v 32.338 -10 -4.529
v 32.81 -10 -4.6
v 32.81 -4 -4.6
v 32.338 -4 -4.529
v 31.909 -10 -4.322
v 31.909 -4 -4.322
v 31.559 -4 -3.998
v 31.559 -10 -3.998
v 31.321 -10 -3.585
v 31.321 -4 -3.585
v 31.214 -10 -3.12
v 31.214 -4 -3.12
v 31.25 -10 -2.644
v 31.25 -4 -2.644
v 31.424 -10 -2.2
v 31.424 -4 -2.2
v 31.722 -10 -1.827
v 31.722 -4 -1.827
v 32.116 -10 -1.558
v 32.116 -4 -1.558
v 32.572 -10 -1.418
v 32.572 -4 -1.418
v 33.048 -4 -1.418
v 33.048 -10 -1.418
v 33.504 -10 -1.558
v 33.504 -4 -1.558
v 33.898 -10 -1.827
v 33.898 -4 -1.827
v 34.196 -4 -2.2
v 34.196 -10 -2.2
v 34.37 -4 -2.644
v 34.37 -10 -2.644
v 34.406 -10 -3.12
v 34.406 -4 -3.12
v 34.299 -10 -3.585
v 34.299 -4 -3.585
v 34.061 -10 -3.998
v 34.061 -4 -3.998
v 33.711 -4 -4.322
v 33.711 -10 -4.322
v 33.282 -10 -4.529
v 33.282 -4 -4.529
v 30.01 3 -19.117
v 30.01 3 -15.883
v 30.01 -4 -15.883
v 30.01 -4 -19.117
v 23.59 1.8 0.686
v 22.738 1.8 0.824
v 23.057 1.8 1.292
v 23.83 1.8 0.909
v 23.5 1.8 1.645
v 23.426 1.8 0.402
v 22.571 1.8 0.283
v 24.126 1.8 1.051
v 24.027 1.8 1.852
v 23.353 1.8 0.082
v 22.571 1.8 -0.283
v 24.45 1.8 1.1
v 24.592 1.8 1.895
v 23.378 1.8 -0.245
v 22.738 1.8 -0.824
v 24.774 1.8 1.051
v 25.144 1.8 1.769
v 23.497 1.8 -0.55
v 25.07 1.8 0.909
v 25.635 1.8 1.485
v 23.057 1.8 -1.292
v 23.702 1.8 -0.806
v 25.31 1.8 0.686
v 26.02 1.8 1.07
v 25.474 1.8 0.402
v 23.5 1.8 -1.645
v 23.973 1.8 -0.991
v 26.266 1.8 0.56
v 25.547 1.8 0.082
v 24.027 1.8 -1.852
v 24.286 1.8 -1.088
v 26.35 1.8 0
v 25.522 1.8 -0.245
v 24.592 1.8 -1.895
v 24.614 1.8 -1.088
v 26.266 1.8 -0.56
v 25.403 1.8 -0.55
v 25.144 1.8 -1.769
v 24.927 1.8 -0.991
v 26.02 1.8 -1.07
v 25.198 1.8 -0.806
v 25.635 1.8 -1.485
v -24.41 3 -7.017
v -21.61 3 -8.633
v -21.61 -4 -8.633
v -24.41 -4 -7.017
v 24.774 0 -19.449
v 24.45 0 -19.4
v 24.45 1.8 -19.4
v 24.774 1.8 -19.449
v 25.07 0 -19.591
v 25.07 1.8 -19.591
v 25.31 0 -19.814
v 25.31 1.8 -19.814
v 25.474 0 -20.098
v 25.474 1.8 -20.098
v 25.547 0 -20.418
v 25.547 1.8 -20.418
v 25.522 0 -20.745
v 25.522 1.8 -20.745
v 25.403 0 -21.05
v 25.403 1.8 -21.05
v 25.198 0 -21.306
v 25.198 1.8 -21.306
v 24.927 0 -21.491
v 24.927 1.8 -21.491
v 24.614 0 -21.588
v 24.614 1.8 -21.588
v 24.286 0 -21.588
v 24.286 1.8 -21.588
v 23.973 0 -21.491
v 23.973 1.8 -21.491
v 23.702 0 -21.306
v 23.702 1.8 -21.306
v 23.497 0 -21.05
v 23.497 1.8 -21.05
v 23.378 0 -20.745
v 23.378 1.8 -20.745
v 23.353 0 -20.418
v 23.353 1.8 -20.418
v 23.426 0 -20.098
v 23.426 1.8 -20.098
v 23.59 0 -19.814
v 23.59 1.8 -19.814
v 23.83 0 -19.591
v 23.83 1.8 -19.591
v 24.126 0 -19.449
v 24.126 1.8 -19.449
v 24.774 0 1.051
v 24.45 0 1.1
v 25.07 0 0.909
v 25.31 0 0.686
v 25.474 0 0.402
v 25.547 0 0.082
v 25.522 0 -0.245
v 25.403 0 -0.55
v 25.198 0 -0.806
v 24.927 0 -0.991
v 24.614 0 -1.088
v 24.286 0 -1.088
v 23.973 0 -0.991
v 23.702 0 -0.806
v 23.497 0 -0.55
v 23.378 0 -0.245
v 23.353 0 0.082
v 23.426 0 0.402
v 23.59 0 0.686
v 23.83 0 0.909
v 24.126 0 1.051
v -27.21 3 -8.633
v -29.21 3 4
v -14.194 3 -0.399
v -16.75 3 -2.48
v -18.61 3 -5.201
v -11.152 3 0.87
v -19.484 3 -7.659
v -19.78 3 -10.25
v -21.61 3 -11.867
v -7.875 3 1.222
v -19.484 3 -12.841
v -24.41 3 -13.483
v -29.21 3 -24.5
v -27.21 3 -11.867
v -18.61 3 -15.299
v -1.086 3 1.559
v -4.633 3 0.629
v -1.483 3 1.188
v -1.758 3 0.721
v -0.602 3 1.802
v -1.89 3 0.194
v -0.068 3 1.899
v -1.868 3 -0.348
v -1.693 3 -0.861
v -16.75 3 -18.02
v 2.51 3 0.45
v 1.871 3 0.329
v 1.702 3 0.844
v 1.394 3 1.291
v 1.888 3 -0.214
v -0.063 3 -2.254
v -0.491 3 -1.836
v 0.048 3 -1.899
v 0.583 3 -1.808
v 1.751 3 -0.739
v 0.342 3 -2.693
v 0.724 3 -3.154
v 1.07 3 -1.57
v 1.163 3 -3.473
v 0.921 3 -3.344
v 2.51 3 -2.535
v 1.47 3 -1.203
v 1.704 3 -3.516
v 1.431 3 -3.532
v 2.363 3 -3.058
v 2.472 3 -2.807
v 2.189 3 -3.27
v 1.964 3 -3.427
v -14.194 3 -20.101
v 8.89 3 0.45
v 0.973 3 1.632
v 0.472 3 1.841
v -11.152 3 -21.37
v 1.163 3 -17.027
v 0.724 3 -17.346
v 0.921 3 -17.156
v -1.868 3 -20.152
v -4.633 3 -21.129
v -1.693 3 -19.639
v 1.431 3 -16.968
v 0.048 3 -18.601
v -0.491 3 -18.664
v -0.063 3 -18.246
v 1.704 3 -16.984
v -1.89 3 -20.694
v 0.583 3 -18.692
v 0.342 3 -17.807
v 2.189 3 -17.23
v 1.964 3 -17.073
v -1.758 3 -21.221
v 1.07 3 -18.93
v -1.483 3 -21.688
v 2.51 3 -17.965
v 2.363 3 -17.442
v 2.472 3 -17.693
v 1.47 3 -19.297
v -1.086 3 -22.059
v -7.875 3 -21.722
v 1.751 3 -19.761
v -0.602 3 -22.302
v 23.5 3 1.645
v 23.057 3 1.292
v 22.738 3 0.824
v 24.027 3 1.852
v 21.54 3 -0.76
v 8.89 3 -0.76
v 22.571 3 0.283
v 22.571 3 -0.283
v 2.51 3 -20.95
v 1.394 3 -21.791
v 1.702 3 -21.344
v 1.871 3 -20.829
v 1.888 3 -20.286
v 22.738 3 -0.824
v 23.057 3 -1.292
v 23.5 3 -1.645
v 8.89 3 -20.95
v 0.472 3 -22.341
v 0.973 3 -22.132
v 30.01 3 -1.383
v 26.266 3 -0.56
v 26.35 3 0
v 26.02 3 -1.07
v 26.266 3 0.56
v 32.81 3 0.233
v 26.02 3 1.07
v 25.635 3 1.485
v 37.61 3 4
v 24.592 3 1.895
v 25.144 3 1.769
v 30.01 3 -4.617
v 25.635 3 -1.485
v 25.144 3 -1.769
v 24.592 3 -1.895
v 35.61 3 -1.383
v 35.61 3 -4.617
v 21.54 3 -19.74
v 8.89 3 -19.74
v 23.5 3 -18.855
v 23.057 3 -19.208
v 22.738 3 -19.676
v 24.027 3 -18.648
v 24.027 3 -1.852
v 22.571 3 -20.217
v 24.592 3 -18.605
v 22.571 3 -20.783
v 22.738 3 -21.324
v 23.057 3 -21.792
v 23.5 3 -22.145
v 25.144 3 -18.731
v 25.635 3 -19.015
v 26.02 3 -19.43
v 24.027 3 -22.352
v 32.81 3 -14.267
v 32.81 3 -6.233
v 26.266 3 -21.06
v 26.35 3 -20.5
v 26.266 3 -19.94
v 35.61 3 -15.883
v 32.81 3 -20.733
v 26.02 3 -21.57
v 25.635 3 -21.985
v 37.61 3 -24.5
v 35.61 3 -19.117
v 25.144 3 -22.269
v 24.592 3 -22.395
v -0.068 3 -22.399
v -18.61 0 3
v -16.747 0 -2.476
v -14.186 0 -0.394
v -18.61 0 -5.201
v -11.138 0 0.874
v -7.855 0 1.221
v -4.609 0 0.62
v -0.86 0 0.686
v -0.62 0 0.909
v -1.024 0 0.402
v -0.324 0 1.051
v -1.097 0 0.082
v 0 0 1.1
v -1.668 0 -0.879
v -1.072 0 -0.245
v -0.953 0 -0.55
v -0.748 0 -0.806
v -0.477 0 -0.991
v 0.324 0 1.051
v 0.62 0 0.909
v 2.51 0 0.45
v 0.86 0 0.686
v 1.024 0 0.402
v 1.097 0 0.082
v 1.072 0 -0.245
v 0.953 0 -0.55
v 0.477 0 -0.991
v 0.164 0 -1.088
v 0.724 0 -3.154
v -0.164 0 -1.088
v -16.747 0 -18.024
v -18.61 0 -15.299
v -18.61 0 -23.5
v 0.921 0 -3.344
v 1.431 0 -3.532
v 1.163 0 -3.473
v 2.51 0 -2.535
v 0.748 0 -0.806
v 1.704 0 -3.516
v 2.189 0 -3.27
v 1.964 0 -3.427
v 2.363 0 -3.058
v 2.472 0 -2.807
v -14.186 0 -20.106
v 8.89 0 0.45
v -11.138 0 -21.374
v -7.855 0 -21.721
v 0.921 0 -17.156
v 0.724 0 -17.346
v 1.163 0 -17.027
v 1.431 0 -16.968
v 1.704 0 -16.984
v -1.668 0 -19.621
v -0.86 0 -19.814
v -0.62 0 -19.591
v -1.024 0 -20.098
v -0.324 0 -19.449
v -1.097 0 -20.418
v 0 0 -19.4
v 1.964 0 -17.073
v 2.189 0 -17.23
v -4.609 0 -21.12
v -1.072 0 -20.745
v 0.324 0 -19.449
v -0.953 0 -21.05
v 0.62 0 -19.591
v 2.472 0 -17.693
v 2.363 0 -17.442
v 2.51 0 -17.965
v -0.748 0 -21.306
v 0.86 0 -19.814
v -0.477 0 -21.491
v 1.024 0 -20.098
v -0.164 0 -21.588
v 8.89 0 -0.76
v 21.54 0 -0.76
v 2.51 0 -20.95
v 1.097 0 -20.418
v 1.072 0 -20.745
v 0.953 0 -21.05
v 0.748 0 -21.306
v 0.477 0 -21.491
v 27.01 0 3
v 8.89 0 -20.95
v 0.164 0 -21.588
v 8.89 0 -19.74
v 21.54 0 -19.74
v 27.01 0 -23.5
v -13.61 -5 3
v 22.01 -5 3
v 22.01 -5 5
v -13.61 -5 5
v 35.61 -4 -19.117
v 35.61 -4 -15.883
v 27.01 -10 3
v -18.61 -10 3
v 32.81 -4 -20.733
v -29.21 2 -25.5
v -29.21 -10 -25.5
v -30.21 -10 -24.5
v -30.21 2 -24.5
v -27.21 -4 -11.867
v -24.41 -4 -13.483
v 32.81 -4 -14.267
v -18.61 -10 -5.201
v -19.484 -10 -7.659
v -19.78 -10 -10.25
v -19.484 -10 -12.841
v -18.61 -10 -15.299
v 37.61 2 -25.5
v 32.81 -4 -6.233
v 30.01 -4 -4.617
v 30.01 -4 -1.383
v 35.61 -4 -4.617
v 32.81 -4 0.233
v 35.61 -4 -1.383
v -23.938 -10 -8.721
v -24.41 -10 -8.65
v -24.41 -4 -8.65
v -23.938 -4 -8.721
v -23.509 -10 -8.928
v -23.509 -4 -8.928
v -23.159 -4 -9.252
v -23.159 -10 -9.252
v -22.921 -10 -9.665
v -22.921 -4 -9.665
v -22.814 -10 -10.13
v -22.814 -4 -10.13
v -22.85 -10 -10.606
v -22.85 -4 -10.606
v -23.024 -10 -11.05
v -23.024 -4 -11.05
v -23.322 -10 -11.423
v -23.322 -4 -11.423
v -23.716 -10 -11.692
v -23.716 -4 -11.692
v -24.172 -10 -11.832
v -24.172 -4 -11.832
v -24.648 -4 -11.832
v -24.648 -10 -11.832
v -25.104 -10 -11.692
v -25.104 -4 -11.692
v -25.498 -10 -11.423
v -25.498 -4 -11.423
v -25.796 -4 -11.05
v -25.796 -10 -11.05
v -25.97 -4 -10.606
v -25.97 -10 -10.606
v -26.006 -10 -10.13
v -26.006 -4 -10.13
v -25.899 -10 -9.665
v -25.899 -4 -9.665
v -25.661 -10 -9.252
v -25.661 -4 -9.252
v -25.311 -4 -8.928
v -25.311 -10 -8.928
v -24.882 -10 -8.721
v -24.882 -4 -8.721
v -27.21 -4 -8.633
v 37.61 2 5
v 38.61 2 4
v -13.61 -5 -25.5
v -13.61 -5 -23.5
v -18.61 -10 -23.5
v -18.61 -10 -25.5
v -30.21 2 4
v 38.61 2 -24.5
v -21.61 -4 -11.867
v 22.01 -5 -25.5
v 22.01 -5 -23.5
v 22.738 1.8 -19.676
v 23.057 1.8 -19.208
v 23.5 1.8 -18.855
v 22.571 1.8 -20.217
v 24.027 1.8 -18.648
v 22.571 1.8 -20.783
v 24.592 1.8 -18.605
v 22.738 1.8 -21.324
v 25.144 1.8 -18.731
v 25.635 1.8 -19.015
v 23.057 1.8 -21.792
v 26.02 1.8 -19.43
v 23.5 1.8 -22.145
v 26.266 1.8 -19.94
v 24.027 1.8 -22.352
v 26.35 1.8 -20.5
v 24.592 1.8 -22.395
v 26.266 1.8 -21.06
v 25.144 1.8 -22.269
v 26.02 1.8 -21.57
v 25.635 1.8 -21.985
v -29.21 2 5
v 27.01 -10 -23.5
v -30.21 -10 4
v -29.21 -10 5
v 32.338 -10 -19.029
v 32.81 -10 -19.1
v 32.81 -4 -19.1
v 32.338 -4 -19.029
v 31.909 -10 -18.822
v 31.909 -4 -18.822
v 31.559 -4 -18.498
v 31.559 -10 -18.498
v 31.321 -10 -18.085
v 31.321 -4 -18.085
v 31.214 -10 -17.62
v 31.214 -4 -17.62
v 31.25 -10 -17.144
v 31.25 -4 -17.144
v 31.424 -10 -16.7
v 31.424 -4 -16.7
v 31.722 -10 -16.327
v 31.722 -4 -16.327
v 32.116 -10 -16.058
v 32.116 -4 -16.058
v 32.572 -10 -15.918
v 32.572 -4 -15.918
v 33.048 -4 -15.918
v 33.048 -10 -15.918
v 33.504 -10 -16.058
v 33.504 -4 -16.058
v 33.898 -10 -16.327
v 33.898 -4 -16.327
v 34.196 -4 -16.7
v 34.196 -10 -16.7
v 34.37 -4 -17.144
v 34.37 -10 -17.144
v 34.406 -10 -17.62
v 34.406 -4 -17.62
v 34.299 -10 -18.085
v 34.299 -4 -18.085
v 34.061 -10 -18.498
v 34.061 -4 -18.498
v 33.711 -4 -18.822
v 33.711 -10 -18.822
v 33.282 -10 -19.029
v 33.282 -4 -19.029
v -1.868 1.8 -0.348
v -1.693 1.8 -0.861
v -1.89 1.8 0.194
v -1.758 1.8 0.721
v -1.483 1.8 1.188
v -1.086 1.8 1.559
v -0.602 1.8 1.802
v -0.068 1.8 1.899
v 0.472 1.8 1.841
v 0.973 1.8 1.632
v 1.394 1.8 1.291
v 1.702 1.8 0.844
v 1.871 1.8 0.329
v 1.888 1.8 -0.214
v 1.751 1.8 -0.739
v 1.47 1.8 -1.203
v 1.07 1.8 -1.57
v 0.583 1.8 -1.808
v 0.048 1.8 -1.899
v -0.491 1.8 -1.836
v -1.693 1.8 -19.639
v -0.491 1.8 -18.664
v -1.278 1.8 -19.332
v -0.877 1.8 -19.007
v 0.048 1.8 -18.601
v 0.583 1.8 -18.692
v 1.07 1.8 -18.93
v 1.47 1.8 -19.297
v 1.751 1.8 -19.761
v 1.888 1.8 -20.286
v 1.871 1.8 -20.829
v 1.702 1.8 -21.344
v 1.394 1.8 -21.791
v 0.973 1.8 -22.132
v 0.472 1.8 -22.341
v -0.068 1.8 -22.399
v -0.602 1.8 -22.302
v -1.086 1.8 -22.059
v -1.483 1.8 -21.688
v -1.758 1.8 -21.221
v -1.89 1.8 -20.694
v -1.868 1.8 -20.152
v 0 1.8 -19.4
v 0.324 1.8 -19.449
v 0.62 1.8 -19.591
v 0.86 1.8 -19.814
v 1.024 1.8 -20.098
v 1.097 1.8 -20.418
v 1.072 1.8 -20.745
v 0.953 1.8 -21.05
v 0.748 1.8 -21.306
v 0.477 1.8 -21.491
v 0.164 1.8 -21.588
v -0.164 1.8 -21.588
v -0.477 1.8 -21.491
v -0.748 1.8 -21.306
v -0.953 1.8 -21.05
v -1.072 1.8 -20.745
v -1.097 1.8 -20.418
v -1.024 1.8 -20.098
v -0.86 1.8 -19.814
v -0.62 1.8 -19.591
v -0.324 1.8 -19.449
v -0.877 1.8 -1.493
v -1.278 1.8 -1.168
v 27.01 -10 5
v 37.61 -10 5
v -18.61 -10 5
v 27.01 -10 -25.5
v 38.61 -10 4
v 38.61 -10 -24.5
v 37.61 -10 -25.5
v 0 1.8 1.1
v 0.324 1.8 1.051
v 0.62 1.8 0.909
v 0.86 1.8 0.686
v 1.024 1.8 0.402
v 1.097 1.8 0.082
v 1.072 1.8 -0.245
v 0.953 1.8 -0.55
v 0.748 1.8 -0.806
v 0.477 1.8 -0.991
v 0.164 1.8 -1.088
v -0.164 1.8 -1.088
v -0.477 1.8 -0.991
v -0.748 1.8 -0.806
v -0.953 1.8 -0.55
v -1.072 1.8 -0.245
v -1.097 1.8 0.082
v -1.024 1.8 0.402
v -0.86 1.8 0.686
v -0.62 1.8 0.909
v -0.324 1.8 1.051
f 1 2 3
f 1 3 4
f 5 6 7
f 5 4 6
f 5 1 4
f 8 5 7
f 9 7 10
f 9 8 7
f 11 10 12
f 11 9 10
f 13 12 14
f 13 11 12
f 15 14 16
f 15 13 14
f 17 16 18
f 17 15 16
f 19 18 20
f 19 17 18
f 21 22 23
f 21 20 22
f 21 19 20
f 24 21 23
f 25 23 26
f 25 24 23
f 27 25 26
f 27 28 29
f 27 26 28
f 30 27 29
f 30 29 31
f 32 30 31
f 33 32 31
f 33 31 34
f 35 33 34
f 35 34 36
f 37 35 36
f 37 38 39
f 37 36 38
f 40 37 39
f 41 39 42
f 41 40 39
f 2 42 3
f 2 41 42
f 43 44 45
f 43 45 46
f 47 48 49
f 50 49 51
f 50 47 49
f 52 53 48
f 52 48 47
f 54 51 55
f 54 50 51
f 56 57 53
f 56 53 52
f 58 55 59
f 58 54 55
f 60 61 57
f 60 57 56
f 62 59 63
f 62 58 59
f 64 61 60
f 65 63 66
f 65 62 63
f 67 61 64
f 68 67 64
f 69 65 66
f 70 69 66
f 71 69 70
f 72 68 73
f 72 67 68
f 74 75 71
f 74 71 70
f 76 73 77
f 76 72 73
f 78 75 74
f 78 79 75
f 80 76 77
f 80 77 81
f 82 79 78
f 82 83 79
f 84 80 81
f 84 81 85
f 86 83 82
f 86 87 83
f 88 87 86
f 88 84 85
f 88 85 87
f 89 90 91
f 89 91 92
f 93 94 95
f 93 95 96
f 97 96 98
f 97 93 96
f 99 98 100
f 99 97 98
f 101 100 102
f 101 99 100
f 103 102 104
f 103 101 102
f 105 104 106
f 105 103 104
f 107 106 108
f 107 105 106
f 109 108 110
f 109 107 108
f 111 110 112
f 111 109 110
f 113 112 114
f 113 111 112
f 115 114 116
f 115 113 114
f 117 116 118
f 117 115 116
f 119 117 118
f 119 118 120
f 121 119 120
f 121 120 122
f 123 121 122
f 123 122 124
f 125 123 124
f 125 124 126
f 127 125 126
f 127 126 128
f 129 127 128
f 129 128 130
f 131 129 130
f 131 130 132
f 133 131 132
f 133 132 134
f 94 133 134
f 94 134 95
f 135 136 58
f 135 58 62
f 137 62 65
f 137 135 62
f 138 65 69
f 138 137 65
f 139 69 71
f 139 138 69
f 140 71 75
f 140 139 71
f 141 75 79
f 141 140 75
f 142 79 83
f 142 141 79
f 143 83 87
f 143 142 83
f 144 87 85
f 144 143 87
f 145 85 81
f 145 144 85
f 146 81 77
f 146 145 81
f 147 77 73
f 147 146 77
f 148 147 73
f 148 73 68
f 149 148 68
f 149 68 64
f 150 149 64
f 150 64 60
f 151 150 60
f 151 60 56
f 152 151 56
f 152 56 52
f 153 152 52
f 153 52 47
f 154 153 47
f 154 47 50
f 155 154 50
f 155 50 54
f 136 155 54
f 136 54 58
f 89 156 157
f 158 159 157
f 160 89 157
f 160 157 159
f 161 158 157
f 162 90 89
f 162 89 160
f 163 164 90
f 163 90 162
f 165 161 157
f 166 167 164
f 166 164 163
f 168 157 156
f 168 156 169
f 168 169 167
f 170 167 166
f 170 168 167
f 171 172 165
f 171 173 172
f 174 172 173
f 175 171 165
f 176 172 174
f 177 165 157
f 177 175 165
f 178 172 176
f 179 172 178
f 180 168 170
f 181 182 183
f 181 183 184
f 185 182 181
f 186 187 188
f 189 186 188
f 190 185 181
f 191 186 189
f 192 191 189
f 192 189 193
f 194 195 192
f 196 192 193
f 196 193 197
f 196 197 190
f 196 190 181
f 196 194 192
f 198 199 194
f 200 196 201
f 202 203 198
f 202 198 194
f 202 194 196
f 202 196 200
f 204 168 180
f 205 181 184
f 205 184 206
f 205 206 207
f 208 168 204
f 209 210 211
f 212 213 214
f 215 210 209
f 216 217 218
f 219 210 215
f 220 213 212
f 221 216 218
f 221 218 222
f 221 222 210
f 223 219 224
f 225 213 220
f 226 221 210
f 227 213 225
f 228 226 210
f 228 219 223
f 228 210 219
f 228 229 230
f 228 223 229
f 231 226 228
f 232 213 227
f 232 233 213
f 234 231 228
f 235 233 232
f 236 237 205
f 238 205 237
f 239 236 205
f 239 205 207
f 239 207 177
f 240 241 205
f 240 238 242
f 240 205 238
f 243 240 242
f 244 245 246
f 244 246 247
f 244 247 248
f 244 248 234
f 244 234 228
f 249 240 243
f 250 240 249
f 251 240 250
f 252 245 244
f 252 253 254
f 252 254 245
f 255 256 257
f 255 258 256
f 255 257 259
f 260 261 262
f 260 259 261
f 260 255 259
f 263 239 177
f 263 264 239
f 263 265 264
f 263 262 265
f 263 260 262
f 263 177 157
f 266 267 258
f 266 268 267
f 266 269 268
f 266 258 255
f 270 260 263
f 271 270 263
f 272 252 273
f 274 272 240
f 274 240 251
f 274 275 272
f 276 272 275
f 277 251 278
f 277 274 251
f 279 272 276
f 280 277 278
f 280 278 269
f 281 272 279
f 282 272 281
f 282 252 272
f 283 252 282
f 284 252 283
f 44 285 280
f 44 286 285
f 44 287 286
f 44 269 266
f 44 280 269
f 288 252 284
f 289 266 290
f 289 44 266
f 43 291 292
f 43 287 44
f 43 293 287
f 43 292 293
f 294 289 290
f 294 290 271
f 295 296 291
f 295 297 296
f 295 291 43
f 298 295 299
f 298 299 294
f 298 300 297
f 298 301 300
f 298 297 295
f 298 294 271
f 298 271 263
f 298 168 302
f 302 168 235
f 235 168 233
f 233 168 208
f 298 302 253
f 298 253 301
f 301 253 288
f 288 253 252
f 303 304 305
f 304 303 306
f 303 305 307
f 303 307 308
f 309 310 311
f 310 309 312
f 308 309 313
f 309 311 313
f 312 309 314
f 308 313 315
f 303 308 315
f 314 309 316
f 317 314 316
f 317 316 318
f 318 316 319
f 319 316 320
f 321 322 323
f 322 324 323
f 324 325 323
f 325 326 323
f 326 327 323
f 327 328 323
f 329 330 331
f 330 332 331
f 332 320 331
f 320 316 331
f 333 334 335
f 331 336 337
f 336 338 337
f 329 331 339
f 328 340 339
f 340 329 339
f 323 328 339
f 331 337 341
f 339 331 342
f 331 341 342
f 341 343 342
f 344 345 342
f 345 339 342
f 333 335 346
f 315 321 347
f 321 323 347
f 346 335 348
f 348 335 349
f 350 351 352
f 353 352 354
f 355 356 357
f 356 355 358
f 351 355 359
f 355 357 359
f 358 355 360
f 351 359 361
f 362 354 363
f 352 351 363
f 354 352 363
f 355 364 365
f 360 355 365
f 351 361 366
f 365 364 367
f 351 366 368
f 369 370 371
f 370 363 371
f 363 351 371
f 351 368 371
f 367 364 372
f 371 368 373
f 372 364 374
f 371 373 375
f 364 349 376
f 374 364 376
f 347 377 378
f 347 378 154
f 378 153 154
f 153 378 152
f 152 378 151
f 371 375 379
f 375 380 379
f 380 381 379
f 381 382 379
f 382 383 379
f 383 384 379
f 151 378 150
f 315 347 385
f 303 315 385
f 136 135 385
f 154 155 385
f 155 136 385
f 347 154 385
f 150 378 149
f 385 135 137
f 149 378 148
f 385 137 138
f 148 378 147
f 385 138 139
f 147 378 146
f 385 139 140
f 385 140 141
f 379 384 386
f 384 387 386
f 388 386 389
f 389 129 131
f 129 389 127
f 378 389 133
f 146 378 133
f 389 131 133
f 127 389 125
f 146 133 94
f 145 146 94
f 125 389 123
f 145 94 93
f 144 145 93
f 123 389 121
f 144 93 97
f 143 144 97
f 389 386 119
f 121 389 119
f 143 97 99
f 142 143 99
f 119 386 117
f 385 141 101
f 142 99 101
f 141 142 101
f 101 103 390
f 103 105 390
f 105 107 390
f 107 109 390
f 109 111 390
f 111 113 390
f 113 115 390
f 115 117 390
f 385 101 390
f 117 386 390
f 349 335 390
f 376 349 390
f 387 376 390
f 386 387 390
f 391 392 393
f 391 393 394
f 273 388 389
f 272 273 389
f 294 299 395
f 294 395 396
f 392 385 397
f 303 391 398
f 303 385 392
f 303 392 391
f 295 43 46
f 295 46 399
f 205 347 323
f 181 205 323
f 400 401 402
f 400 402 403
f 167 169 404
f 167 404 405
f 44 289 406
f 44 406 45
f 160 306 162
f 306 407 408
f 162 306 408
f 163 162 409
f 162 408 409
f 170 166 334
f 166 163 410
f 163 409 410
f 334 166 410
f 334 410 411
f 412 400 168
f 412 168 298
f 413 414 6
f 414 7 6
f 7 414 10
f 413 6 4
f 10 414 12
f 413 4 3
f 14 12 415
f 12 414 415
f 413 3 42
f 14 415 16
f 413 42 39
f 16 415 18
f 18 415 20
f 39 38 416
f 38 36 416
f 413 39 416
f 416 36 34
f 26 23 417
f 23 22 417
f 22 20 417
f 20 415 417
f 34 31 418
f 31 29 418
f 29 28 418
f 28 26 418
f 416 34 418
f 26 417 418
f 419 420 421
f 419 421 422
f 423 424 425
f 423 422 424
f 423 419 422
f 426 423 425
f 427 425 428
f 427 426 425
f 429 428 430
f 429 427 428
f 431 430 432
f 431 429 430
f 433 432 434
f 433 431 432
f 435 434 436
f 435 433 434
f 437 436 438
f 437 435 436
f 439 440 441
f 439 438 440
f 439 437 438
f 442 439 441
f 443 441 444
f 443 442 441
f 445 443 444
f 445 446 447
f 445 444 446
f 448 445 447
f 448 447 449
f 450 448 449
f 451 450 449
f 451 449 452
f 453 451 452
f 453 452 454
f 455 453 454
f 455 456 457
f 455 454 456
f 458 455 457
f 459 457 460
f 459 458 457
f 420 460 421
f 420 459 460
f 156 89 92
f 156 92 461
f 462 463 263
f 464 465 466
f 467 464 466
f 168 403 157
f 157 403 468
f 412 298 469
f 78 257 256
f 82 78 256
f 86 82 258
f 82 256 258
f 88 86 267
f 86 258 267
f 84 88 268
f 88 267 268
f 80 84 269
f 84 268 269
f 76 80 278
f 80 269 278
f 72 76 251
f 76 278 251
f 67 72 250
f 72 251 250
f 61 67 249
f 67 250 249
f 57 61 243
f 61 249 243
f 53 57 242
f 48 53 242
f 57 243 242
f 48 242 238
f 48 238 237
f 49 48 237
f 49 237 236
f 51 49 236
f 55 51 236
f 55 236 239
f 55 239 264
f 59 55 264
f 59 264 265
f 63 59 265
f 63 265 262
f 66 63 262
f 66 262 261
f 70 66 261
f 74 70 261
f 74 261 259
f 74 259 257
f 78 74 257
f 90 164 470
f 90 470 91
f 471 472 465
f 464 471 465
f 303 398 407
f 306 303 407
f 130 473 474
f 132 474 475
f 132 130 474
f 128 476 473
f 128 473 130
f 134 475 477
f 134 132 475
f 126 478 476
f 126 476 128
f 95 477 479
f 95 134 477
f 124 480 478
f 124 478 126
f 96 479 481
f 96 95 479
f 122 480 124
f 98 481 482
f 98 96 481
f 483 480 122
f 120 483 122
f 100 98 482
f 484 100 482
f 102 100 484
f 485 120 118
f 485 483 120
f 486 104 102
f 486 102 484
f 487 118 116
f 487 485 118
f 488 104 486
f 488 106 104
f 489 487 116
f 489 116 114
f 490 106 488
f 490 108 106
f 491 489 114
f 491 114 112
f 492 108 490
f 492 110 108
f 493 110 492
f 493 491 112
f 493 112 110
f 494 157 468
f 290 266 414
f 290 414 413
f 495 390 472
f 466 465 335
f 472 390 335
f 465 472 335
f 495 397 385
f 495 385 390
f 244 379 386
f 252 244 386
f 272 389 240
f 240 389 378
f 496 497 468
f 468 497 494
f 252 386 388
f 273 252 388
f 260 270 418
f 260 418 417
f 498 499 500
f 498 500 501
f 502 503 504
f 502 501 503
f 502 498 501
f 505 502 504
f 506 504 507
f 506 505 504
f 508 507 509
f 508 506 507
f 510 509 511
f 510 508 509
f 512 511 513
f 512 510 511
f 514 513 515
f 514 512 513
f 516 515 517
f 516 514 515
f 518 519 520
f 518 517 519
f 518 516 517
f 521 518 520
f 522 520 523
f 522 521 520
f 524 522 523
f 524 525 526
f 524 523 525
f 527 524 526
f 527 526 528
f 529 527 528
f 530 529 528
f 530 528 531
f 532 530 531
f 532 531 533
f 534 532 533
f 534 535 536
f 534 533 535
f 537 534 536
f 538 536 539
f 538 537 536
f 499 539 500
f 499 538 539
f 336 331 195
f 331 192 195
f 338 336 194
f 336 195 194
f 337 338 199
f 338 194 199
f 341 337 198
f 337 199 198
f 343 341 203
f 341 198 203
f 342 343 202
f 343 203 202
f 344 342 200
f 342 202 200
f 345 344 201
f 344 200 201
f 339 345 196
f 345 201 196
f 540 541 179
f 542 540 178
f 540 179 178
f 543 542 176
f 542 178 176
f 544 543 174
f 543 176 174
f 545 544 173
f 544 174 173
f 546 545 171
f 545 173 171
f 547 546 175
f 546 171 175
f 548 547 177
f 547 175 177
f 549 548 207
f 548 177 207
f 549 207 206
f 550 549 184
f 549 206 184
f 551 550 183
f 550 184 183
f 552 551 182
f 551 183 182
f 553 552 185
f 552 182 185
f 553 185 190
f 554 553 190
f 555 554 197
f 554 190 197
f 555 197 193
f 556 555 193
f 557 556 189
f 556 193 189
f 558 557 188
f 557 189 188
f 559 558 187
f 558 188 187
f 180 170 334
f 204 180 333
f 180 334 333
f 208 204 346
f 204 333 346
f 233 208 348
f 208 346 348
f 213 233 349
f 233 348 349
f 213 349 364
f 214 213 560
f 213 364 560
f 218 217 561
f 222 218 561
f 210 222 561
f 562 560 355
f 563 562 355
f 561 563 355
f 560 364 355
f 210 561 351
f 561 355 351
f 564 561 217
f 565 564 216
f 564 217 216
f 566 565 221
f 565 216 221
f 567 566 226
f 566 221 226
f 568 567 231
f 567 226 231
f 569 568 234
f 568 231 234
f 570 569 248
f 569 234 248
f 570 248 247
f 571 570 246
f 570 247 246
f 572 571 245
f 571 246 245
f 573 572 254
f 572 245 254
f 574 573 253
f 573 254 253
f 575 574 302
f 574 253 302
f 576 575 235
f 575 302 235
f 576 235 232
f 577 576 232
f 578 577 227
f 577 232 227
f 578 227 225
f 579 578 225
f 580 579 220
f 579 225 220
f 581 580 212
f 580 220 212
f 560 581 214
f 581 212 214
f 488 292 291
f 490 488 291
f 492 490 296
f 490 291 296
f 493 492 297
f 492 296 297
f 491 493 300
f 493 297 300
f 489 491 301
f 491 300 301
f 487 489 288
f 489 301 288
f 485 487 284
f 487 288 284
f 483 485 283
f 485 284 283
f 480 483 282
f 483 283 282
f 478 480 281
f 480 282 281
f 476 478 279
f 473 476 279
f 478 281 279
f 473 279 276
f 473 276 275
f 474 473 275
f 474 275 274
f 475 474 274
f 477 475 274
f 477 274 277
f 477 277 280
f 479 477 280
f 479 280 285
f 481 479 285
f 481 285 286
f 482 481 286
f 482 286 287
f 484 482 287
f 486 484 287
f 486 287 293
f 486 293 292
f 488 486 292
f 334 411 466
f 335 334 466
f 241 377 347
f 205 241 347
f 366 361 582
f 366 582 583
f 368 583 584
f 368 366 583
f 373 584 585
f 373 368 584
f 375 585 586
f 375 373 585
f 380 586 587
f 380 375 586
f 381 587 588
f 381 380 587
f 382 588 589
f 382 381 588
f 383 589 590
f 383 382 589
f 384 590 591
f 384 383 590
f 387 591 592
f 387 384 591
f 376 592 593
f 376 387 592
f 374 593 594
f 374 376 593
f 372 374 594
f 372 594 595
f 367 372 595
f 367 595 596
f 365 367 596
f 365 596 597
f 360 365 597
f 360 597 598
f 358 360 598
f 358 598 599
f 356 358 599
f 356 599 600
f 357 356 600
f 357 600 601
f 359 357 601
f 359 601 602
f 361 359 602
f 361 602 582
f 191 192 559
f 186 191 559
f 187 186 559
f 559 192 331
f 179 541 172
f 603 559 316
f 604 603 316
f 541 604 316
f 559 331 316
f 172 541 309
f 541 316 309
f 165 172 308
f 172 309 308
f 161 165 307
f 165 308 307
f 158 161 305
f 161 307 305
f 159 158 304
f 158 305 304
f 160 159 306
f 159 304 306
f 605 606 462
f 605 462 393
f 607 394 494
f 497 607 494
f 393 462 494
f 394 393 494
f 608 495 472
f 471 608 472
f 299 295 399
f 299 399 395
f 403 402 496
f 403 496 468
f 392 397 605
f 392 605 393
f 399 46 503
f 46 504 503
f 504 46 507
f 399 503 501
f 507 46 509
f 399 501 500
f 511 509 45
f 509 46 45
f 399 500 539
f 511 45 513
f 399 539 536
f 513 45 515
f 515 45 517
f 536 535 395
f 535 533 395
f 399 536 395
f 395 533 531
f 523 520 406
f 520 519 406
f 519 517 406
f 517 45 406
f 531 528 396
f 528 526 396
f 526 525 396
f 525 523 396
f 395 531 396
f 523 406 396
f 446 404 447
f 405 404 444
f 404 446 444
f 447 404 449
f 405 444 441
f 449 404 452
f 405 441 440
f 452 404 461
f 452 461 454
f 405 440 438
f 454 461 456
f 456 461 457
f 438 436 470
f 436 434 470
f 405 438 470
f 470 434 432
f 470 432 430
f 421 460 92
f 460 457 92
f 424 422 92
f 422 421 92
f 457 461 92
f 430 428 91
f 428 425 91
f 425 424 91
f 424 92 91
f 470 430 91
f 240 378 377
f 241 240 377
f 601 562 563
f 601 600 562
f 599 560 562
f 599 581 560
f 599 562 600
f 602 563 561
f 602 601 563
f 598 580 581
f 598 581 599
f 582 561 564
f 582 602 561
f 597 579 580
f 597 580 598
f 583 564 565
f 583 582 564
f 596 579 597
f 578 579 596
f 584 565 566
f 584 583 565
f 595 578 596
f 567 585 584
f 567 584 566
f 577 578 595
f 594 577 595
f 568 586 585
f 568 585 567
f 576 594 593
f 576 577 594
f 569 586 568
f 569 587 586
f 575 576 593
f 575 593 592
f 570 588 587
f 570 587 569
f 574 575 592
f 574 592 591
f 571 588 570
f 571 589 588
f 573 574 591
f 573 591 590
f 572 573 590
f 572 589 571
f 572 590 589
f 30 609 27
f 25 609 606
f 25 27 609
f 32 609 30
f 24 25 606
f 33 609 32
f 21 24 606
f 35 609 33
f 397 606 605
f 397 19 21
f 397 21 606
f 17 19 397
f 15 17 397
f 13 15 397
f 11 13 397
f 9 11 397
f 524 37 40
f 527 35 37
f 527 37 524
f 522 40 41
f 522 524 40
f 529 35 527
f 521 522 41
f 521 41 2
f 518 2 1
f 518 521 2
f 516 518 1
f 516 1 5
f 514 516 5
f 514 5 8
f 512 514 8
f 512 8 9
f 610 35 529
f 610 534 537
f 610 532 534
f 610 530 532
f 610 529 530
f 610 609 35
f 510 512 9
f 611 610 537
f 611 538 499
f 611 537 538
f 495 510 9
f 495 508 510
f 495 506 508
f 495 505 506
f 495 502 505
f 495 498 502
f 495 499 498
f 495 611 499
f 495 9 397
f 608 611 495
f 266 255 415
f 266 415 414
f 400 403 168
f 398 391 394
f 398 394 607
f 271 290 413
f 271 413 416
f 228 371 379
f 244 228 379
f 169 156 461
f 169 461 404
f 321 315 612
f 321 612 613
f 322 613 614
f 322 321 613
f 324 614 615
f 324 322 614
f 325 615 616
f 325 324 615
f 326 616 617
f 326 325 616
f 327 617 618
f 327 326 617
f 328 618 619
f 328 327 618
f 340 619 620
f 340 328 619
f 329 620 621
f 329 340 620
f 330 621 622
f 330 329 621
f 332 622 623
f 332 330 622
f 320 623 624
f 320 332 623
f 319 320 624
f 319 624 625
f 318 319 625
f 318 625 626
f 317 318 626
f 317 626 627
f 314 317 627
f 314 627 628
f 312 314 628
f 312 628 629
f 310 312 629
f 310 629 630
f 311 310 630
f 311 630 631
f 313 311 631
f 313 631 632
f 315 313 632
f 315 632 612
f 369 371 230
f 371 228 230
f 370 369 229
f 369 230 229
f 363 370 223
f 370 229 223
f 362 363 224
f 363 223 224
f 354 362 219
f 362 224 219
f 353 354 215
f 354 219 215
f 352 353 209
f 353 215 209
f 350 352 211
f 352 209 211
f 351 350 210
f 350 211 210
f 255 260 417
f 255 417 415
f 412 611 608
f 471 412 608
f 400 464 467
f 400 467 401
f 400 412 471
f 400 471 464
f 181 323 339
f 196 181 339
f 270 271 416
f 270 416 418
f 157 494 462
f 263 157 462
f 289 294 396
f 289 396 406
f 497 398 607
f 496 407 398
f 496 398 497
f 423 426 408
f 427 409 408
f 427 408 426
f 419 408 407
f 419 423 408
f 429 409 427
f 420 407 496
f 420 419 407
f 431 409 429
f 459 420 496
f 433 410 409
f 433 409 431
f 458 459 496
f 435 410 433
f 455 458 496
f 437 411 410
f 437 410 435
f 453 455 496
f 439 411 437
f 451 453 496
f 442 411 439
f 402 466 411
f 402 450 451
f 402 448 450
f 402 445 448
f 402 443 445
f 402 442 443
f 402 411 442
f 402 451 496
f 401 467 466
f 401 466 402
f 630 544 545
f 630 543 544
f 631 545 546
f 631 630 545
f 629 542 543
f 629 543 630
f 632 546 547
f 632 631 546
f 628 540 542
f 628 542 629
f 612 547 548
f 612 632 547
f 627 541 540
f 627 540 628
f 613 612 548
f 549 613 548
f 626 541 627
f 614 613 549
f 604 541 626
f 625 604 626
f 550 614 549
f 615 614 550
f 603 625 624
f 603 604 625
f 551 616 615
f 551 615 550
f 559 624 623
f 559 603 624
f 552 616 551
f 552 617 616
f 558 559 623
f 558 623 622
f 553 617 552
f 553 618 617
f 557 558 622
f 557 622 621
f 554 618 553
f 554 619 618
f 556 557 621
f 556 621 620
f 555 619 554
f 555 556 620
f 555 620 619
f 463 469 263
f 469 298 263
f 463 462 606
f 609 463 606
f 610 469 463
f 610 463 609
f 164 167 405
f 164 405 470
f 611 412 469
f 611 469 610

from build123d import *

# Parameters (mm, degrees)
ESQUISSE1_W                                        = 50.5
ESQUISSE1_H                                        = 26.5
ESQUISSE1_R                                        = 1.1
BOSS_EXTRU_1_DEPTH                                 = 3
CONG_1_R                                           = 1
CHAMBRAGE_POUR_VIS_SIX_PANS_CREUX_M1_6_D           = 2.2
CHAMBRAGE_POUR_VIS_SIX_PANS_CREUX_M1_6_CBORE_D     = 3.8
CHAMBRAGE_POUR_VIS_SIX_PANS_CREUX_M1_6_CBORE_DEPTH = 1.2
BOSS_EXTRU_2_START                                 = -19
ESQUISSE4_R                                        = 1.6
ESQUISSE4_W                                        = 11.6
ESQUISSE4_H                                        = 26.5
BOSS_EXTRU_2_DEPTH                                 = 19
ENL_V_START                                        = -19
ENL_V_MAT_EXTRU_1_DEPTH                            = 7
ESQUISSE6_W                                        = 11.6
ESQUISSE6_H                                        = 6
ENL_V_MAT_EXTRU_2_DEPTH                            = 50.487191272
BOSS_EXTRU_3_DEPTH                                 = 2
CHANFREIN1_SIZE                                    = 1


with BuildPart() as part:
    # Esquisse1 → Boss.-Extru.1 (new body)
    with BuildSketch(Plane(origin=(0, 0, 0), x_dir=(1, 0, 0), z_dir=(0, 1, 0))):
        with Locations((4.2, 10.25)):
            Rectangle(ESQUISSE1_W, ESQUISSE1_H)
        with Locations(Location((0, 0, 0), (0, 0, 270))):
            Circle(ESQUISSE1_R, mode=Mode.SUBTRACT)
        with Locations(Location((24.45, 0, 0), (0, 0, 270))):
            Circle(ESQUISSE1_R, mode=Mode.SUBTRACT)
        with BuildLine():
            Line((8.89, 20.95), (8.89, 19.74))
            Line((8.89, 19.74), (21.54, 19.74))
            Line((21.54, 19.74), (21.54, 0.76))
            Line((21.54, 0.76), (8.89, 0.76))
            Line((8.89, 0.76), (8.89, -0.45))
            Line((8.89, -0.45), (2.51, -0.45))
            Line((2.51, -0.45), (2.51, 6.385507795))
            ThreePointArc((2.51, 6.385507795), (-19.78, 10.25), (2.51, 14.114492205))
            Line((2.51, 14.114492205), (2.51, 20.95))
            Line((2.51, 20.95), (8.89, 20.95))
        make_face(mode=Mode.SUBTRACT)
        with Locations(Location((0, 20.5, 0), (0, 0, 270))):
            Circle(ESQUISSE1_R, mode=Mode.SUBTRACT)
        with Locations(Location((24.45, 20.5, 0), (0, 0, 270))):
            Circle(ESQUISSE1_R, mode=Mode.SUBTRACT)
    extrude(amount=BOSS_EXTRU_1_DEPTH)

    # Congé1
    cong_1_edges = [part.edges().sort_by_distance(p)[0] for p in [
        (2.51, 1.5, -6.385507795),
        (2.51, 1.5, -14.114492205),
    ]]
    fillet(cong_1_edges, radius=CONG_1_R)

    # Chambrage pour vis à six pans creux M1.61 (through all)
    with Locations(Plane(origin=(0, 3, 0), x_dir=(1, 0, 0), z_dir=(0, 1, 0))):
        with Locations((0, 0), (0, 20.5), (24.45, 20.5), (24.45, 0)):
            CounterBoreHole(CHAMBRAGE_POUR_VIS_SIX_PANS_CREUX_M1_6_D / 2, CHAMBRAGE_POUR_VIS_SIX_PANS_CREUX_M1_6_CBORE_D / 2, CHAMBRAGE_POUR_VIS_SIX_PANS_CREUX_M1_6_CBORE_DEPTH)

    # Esquisse4 → Boss.-Extru.2 (add)
    # profile 1 of 2: a face of its own
    with BuildSketch(Plane(origin=(0, 3, 0), x_dir=(1, 0, 0), z_dir=(0, 1, 0)).offset(BOSS_EXTRU_2_START)):
        with BuildLine():
            Line((-18.61, 23.5), (-30.21, 23.5))
            Line((-30.21, 23.5), (-30.21, -3))
            Line((-30.21, -3), (-18.61, -3))
            Line((-18.61, -3), (-18.61, 5.200811946))
            ThreePointArc((-18.61, 5.200811946), (-19.78, 10.25), (-18.61, 15.299188054))
            Line((-18.61, 15.299188054), (-18.61, 23.5))
        make_face()
        with Locations(Location((-24.41, 10.25, 0), (0, 0, 270))):
            Circle(ESQUISSE4_R, mode=Mode.SUBTRACT)
    # profile 2 of 2: a face of its own
    with BuildSketch(Plane(origin=(0, 3, 0), x_dir=(1, 0, 0), z_dir=(0, 1, 0)).offset(BOSS_EXTRU_2_START)):
        with Locations((32.81, 10.25)):
            Rectangle(ESQUISSE4_W, ESQUISSE4_H)
        with Locations(Location((32.81, 3, 0), (0, 0, 90))):
            Circle(ESQUISSE4_R, mode=Mode.SUBTRACT)
        with Locations(Location((32.81, 17.5, 0), (0, 0, 90))):
            Circle(ESQUISSE4_R, mode=Mode.SUBTRACT)
    extrude(amount=BOSS_EXTRU_2_DEPTH)

    # Esquisse5 → Enlèv. mat.-Extru.1 (cut)
    with BuildSketch(Plane.XZ.offset(16).offset(ENL_V_START)):
        Polygon((-24.41, -7.016838493), (-27.21, -8.633419246), (-27.21, -11.866580754), (-24.41, -13.483161507), (-21.61, -11.866580754), (-21.61, -8.633419246), align=None)
        Polygon((32.81, -14.266838493), (30.01, -15.883419246), (30.01, -19.116580754), (32.81, -20.733161507), (35.61, -19.116580754), (35.61, -15.883419246), align=None)
        Polygon((32.81, 0.233161507), (30.01, -1.383419246), (30.01, -4.616580754), (32.81, -6.233161507), (35.61, -4.616580754), (35.61, -1.383419246), align=None)
    extrude(amount=ENL_V_MAT_EXTRU_1_DEPTH, mode=Mode.SUBTRACT)

    # Esquisse6 → Enlèv. mat.-Extru.2 (cut, through all)
    with BuildSketch(Plane(origin=(0, 0, -23.5), x_dir=(-1, 0, 0), z_dir=(0, 0, -1))):
        with Locations((-32.81, -13)):
            Rectangle(ESQUISSE6_W, ESQUISSE6_H)
        with Locations((24.41, -13)):
            Rectangle(ESQUISSE6_W, ESQUISSE6_H)
    extrude(amount=-ENL_V_MAT_EXTRU_2_DEPTH, mode=Mode.SUBTRACT)

    # Esquisse7 → Boss.-Extru.3 (add)
    with BuildSketch(Plane(origin=(0, 0, -23.5), x_dir=(-1, 0, 0), z_dir=(0, 0, -1))):
        Polygon((8.61, 0), (-4.2, 0), (-17.01, 0), (-22.01, -5), (13.61, -5), align=None)
        Polygon((-22.01, -5), (-17.01, 0), (-27.01, 0), (-27.01, -10), align=None)
        Polygon((-17.01, 0), (-4.2, 0), (-4.2, 3), (-38.61, 3), (-38.61, -10), (-27.01, -10), (-27.01, 0), align=None)
        Polygon((18.61, 0), (8.61, 0), (13.61, -5), (18.61, -10), align=None)
        Polygon((-4.2, 3), (-4.2, 0), (8.61, 0), (18.61, 0), (18.61, -10), (30.21, -10), (30.21, 3), align=None)
    boss_extru_3 = extrude(amount=BOSS_EXTRU_3_DEPTH)

    # Symétrie1: Boss.-Extru.3 across plane
    add(boss_extru_3.mirror(Plane(origin=(0, 0, -10.25), x_dir=(1, 0, 0), z_dir=(0, 0, -1))))

    # Chanfrein1
    chanfrein1_edges = [part.edges().sort_by_distance(p)[0] for p in [
        (-30.21, 3, -10.25),
        (38.61, 3, -10.25),
        (-30.21, -3.5, -25.5),
        (4.2, 3, -25.5),
        (38.61, -3.5, -25.5),
        (38.61, -3.5, 5),
        (4.2, 3, 5),
        (-30.21, -3.5, 5),
    ]]
    chamfer(chanfrein1_edges, length=CHANFREIN1_SIZE)


solid = part.part
